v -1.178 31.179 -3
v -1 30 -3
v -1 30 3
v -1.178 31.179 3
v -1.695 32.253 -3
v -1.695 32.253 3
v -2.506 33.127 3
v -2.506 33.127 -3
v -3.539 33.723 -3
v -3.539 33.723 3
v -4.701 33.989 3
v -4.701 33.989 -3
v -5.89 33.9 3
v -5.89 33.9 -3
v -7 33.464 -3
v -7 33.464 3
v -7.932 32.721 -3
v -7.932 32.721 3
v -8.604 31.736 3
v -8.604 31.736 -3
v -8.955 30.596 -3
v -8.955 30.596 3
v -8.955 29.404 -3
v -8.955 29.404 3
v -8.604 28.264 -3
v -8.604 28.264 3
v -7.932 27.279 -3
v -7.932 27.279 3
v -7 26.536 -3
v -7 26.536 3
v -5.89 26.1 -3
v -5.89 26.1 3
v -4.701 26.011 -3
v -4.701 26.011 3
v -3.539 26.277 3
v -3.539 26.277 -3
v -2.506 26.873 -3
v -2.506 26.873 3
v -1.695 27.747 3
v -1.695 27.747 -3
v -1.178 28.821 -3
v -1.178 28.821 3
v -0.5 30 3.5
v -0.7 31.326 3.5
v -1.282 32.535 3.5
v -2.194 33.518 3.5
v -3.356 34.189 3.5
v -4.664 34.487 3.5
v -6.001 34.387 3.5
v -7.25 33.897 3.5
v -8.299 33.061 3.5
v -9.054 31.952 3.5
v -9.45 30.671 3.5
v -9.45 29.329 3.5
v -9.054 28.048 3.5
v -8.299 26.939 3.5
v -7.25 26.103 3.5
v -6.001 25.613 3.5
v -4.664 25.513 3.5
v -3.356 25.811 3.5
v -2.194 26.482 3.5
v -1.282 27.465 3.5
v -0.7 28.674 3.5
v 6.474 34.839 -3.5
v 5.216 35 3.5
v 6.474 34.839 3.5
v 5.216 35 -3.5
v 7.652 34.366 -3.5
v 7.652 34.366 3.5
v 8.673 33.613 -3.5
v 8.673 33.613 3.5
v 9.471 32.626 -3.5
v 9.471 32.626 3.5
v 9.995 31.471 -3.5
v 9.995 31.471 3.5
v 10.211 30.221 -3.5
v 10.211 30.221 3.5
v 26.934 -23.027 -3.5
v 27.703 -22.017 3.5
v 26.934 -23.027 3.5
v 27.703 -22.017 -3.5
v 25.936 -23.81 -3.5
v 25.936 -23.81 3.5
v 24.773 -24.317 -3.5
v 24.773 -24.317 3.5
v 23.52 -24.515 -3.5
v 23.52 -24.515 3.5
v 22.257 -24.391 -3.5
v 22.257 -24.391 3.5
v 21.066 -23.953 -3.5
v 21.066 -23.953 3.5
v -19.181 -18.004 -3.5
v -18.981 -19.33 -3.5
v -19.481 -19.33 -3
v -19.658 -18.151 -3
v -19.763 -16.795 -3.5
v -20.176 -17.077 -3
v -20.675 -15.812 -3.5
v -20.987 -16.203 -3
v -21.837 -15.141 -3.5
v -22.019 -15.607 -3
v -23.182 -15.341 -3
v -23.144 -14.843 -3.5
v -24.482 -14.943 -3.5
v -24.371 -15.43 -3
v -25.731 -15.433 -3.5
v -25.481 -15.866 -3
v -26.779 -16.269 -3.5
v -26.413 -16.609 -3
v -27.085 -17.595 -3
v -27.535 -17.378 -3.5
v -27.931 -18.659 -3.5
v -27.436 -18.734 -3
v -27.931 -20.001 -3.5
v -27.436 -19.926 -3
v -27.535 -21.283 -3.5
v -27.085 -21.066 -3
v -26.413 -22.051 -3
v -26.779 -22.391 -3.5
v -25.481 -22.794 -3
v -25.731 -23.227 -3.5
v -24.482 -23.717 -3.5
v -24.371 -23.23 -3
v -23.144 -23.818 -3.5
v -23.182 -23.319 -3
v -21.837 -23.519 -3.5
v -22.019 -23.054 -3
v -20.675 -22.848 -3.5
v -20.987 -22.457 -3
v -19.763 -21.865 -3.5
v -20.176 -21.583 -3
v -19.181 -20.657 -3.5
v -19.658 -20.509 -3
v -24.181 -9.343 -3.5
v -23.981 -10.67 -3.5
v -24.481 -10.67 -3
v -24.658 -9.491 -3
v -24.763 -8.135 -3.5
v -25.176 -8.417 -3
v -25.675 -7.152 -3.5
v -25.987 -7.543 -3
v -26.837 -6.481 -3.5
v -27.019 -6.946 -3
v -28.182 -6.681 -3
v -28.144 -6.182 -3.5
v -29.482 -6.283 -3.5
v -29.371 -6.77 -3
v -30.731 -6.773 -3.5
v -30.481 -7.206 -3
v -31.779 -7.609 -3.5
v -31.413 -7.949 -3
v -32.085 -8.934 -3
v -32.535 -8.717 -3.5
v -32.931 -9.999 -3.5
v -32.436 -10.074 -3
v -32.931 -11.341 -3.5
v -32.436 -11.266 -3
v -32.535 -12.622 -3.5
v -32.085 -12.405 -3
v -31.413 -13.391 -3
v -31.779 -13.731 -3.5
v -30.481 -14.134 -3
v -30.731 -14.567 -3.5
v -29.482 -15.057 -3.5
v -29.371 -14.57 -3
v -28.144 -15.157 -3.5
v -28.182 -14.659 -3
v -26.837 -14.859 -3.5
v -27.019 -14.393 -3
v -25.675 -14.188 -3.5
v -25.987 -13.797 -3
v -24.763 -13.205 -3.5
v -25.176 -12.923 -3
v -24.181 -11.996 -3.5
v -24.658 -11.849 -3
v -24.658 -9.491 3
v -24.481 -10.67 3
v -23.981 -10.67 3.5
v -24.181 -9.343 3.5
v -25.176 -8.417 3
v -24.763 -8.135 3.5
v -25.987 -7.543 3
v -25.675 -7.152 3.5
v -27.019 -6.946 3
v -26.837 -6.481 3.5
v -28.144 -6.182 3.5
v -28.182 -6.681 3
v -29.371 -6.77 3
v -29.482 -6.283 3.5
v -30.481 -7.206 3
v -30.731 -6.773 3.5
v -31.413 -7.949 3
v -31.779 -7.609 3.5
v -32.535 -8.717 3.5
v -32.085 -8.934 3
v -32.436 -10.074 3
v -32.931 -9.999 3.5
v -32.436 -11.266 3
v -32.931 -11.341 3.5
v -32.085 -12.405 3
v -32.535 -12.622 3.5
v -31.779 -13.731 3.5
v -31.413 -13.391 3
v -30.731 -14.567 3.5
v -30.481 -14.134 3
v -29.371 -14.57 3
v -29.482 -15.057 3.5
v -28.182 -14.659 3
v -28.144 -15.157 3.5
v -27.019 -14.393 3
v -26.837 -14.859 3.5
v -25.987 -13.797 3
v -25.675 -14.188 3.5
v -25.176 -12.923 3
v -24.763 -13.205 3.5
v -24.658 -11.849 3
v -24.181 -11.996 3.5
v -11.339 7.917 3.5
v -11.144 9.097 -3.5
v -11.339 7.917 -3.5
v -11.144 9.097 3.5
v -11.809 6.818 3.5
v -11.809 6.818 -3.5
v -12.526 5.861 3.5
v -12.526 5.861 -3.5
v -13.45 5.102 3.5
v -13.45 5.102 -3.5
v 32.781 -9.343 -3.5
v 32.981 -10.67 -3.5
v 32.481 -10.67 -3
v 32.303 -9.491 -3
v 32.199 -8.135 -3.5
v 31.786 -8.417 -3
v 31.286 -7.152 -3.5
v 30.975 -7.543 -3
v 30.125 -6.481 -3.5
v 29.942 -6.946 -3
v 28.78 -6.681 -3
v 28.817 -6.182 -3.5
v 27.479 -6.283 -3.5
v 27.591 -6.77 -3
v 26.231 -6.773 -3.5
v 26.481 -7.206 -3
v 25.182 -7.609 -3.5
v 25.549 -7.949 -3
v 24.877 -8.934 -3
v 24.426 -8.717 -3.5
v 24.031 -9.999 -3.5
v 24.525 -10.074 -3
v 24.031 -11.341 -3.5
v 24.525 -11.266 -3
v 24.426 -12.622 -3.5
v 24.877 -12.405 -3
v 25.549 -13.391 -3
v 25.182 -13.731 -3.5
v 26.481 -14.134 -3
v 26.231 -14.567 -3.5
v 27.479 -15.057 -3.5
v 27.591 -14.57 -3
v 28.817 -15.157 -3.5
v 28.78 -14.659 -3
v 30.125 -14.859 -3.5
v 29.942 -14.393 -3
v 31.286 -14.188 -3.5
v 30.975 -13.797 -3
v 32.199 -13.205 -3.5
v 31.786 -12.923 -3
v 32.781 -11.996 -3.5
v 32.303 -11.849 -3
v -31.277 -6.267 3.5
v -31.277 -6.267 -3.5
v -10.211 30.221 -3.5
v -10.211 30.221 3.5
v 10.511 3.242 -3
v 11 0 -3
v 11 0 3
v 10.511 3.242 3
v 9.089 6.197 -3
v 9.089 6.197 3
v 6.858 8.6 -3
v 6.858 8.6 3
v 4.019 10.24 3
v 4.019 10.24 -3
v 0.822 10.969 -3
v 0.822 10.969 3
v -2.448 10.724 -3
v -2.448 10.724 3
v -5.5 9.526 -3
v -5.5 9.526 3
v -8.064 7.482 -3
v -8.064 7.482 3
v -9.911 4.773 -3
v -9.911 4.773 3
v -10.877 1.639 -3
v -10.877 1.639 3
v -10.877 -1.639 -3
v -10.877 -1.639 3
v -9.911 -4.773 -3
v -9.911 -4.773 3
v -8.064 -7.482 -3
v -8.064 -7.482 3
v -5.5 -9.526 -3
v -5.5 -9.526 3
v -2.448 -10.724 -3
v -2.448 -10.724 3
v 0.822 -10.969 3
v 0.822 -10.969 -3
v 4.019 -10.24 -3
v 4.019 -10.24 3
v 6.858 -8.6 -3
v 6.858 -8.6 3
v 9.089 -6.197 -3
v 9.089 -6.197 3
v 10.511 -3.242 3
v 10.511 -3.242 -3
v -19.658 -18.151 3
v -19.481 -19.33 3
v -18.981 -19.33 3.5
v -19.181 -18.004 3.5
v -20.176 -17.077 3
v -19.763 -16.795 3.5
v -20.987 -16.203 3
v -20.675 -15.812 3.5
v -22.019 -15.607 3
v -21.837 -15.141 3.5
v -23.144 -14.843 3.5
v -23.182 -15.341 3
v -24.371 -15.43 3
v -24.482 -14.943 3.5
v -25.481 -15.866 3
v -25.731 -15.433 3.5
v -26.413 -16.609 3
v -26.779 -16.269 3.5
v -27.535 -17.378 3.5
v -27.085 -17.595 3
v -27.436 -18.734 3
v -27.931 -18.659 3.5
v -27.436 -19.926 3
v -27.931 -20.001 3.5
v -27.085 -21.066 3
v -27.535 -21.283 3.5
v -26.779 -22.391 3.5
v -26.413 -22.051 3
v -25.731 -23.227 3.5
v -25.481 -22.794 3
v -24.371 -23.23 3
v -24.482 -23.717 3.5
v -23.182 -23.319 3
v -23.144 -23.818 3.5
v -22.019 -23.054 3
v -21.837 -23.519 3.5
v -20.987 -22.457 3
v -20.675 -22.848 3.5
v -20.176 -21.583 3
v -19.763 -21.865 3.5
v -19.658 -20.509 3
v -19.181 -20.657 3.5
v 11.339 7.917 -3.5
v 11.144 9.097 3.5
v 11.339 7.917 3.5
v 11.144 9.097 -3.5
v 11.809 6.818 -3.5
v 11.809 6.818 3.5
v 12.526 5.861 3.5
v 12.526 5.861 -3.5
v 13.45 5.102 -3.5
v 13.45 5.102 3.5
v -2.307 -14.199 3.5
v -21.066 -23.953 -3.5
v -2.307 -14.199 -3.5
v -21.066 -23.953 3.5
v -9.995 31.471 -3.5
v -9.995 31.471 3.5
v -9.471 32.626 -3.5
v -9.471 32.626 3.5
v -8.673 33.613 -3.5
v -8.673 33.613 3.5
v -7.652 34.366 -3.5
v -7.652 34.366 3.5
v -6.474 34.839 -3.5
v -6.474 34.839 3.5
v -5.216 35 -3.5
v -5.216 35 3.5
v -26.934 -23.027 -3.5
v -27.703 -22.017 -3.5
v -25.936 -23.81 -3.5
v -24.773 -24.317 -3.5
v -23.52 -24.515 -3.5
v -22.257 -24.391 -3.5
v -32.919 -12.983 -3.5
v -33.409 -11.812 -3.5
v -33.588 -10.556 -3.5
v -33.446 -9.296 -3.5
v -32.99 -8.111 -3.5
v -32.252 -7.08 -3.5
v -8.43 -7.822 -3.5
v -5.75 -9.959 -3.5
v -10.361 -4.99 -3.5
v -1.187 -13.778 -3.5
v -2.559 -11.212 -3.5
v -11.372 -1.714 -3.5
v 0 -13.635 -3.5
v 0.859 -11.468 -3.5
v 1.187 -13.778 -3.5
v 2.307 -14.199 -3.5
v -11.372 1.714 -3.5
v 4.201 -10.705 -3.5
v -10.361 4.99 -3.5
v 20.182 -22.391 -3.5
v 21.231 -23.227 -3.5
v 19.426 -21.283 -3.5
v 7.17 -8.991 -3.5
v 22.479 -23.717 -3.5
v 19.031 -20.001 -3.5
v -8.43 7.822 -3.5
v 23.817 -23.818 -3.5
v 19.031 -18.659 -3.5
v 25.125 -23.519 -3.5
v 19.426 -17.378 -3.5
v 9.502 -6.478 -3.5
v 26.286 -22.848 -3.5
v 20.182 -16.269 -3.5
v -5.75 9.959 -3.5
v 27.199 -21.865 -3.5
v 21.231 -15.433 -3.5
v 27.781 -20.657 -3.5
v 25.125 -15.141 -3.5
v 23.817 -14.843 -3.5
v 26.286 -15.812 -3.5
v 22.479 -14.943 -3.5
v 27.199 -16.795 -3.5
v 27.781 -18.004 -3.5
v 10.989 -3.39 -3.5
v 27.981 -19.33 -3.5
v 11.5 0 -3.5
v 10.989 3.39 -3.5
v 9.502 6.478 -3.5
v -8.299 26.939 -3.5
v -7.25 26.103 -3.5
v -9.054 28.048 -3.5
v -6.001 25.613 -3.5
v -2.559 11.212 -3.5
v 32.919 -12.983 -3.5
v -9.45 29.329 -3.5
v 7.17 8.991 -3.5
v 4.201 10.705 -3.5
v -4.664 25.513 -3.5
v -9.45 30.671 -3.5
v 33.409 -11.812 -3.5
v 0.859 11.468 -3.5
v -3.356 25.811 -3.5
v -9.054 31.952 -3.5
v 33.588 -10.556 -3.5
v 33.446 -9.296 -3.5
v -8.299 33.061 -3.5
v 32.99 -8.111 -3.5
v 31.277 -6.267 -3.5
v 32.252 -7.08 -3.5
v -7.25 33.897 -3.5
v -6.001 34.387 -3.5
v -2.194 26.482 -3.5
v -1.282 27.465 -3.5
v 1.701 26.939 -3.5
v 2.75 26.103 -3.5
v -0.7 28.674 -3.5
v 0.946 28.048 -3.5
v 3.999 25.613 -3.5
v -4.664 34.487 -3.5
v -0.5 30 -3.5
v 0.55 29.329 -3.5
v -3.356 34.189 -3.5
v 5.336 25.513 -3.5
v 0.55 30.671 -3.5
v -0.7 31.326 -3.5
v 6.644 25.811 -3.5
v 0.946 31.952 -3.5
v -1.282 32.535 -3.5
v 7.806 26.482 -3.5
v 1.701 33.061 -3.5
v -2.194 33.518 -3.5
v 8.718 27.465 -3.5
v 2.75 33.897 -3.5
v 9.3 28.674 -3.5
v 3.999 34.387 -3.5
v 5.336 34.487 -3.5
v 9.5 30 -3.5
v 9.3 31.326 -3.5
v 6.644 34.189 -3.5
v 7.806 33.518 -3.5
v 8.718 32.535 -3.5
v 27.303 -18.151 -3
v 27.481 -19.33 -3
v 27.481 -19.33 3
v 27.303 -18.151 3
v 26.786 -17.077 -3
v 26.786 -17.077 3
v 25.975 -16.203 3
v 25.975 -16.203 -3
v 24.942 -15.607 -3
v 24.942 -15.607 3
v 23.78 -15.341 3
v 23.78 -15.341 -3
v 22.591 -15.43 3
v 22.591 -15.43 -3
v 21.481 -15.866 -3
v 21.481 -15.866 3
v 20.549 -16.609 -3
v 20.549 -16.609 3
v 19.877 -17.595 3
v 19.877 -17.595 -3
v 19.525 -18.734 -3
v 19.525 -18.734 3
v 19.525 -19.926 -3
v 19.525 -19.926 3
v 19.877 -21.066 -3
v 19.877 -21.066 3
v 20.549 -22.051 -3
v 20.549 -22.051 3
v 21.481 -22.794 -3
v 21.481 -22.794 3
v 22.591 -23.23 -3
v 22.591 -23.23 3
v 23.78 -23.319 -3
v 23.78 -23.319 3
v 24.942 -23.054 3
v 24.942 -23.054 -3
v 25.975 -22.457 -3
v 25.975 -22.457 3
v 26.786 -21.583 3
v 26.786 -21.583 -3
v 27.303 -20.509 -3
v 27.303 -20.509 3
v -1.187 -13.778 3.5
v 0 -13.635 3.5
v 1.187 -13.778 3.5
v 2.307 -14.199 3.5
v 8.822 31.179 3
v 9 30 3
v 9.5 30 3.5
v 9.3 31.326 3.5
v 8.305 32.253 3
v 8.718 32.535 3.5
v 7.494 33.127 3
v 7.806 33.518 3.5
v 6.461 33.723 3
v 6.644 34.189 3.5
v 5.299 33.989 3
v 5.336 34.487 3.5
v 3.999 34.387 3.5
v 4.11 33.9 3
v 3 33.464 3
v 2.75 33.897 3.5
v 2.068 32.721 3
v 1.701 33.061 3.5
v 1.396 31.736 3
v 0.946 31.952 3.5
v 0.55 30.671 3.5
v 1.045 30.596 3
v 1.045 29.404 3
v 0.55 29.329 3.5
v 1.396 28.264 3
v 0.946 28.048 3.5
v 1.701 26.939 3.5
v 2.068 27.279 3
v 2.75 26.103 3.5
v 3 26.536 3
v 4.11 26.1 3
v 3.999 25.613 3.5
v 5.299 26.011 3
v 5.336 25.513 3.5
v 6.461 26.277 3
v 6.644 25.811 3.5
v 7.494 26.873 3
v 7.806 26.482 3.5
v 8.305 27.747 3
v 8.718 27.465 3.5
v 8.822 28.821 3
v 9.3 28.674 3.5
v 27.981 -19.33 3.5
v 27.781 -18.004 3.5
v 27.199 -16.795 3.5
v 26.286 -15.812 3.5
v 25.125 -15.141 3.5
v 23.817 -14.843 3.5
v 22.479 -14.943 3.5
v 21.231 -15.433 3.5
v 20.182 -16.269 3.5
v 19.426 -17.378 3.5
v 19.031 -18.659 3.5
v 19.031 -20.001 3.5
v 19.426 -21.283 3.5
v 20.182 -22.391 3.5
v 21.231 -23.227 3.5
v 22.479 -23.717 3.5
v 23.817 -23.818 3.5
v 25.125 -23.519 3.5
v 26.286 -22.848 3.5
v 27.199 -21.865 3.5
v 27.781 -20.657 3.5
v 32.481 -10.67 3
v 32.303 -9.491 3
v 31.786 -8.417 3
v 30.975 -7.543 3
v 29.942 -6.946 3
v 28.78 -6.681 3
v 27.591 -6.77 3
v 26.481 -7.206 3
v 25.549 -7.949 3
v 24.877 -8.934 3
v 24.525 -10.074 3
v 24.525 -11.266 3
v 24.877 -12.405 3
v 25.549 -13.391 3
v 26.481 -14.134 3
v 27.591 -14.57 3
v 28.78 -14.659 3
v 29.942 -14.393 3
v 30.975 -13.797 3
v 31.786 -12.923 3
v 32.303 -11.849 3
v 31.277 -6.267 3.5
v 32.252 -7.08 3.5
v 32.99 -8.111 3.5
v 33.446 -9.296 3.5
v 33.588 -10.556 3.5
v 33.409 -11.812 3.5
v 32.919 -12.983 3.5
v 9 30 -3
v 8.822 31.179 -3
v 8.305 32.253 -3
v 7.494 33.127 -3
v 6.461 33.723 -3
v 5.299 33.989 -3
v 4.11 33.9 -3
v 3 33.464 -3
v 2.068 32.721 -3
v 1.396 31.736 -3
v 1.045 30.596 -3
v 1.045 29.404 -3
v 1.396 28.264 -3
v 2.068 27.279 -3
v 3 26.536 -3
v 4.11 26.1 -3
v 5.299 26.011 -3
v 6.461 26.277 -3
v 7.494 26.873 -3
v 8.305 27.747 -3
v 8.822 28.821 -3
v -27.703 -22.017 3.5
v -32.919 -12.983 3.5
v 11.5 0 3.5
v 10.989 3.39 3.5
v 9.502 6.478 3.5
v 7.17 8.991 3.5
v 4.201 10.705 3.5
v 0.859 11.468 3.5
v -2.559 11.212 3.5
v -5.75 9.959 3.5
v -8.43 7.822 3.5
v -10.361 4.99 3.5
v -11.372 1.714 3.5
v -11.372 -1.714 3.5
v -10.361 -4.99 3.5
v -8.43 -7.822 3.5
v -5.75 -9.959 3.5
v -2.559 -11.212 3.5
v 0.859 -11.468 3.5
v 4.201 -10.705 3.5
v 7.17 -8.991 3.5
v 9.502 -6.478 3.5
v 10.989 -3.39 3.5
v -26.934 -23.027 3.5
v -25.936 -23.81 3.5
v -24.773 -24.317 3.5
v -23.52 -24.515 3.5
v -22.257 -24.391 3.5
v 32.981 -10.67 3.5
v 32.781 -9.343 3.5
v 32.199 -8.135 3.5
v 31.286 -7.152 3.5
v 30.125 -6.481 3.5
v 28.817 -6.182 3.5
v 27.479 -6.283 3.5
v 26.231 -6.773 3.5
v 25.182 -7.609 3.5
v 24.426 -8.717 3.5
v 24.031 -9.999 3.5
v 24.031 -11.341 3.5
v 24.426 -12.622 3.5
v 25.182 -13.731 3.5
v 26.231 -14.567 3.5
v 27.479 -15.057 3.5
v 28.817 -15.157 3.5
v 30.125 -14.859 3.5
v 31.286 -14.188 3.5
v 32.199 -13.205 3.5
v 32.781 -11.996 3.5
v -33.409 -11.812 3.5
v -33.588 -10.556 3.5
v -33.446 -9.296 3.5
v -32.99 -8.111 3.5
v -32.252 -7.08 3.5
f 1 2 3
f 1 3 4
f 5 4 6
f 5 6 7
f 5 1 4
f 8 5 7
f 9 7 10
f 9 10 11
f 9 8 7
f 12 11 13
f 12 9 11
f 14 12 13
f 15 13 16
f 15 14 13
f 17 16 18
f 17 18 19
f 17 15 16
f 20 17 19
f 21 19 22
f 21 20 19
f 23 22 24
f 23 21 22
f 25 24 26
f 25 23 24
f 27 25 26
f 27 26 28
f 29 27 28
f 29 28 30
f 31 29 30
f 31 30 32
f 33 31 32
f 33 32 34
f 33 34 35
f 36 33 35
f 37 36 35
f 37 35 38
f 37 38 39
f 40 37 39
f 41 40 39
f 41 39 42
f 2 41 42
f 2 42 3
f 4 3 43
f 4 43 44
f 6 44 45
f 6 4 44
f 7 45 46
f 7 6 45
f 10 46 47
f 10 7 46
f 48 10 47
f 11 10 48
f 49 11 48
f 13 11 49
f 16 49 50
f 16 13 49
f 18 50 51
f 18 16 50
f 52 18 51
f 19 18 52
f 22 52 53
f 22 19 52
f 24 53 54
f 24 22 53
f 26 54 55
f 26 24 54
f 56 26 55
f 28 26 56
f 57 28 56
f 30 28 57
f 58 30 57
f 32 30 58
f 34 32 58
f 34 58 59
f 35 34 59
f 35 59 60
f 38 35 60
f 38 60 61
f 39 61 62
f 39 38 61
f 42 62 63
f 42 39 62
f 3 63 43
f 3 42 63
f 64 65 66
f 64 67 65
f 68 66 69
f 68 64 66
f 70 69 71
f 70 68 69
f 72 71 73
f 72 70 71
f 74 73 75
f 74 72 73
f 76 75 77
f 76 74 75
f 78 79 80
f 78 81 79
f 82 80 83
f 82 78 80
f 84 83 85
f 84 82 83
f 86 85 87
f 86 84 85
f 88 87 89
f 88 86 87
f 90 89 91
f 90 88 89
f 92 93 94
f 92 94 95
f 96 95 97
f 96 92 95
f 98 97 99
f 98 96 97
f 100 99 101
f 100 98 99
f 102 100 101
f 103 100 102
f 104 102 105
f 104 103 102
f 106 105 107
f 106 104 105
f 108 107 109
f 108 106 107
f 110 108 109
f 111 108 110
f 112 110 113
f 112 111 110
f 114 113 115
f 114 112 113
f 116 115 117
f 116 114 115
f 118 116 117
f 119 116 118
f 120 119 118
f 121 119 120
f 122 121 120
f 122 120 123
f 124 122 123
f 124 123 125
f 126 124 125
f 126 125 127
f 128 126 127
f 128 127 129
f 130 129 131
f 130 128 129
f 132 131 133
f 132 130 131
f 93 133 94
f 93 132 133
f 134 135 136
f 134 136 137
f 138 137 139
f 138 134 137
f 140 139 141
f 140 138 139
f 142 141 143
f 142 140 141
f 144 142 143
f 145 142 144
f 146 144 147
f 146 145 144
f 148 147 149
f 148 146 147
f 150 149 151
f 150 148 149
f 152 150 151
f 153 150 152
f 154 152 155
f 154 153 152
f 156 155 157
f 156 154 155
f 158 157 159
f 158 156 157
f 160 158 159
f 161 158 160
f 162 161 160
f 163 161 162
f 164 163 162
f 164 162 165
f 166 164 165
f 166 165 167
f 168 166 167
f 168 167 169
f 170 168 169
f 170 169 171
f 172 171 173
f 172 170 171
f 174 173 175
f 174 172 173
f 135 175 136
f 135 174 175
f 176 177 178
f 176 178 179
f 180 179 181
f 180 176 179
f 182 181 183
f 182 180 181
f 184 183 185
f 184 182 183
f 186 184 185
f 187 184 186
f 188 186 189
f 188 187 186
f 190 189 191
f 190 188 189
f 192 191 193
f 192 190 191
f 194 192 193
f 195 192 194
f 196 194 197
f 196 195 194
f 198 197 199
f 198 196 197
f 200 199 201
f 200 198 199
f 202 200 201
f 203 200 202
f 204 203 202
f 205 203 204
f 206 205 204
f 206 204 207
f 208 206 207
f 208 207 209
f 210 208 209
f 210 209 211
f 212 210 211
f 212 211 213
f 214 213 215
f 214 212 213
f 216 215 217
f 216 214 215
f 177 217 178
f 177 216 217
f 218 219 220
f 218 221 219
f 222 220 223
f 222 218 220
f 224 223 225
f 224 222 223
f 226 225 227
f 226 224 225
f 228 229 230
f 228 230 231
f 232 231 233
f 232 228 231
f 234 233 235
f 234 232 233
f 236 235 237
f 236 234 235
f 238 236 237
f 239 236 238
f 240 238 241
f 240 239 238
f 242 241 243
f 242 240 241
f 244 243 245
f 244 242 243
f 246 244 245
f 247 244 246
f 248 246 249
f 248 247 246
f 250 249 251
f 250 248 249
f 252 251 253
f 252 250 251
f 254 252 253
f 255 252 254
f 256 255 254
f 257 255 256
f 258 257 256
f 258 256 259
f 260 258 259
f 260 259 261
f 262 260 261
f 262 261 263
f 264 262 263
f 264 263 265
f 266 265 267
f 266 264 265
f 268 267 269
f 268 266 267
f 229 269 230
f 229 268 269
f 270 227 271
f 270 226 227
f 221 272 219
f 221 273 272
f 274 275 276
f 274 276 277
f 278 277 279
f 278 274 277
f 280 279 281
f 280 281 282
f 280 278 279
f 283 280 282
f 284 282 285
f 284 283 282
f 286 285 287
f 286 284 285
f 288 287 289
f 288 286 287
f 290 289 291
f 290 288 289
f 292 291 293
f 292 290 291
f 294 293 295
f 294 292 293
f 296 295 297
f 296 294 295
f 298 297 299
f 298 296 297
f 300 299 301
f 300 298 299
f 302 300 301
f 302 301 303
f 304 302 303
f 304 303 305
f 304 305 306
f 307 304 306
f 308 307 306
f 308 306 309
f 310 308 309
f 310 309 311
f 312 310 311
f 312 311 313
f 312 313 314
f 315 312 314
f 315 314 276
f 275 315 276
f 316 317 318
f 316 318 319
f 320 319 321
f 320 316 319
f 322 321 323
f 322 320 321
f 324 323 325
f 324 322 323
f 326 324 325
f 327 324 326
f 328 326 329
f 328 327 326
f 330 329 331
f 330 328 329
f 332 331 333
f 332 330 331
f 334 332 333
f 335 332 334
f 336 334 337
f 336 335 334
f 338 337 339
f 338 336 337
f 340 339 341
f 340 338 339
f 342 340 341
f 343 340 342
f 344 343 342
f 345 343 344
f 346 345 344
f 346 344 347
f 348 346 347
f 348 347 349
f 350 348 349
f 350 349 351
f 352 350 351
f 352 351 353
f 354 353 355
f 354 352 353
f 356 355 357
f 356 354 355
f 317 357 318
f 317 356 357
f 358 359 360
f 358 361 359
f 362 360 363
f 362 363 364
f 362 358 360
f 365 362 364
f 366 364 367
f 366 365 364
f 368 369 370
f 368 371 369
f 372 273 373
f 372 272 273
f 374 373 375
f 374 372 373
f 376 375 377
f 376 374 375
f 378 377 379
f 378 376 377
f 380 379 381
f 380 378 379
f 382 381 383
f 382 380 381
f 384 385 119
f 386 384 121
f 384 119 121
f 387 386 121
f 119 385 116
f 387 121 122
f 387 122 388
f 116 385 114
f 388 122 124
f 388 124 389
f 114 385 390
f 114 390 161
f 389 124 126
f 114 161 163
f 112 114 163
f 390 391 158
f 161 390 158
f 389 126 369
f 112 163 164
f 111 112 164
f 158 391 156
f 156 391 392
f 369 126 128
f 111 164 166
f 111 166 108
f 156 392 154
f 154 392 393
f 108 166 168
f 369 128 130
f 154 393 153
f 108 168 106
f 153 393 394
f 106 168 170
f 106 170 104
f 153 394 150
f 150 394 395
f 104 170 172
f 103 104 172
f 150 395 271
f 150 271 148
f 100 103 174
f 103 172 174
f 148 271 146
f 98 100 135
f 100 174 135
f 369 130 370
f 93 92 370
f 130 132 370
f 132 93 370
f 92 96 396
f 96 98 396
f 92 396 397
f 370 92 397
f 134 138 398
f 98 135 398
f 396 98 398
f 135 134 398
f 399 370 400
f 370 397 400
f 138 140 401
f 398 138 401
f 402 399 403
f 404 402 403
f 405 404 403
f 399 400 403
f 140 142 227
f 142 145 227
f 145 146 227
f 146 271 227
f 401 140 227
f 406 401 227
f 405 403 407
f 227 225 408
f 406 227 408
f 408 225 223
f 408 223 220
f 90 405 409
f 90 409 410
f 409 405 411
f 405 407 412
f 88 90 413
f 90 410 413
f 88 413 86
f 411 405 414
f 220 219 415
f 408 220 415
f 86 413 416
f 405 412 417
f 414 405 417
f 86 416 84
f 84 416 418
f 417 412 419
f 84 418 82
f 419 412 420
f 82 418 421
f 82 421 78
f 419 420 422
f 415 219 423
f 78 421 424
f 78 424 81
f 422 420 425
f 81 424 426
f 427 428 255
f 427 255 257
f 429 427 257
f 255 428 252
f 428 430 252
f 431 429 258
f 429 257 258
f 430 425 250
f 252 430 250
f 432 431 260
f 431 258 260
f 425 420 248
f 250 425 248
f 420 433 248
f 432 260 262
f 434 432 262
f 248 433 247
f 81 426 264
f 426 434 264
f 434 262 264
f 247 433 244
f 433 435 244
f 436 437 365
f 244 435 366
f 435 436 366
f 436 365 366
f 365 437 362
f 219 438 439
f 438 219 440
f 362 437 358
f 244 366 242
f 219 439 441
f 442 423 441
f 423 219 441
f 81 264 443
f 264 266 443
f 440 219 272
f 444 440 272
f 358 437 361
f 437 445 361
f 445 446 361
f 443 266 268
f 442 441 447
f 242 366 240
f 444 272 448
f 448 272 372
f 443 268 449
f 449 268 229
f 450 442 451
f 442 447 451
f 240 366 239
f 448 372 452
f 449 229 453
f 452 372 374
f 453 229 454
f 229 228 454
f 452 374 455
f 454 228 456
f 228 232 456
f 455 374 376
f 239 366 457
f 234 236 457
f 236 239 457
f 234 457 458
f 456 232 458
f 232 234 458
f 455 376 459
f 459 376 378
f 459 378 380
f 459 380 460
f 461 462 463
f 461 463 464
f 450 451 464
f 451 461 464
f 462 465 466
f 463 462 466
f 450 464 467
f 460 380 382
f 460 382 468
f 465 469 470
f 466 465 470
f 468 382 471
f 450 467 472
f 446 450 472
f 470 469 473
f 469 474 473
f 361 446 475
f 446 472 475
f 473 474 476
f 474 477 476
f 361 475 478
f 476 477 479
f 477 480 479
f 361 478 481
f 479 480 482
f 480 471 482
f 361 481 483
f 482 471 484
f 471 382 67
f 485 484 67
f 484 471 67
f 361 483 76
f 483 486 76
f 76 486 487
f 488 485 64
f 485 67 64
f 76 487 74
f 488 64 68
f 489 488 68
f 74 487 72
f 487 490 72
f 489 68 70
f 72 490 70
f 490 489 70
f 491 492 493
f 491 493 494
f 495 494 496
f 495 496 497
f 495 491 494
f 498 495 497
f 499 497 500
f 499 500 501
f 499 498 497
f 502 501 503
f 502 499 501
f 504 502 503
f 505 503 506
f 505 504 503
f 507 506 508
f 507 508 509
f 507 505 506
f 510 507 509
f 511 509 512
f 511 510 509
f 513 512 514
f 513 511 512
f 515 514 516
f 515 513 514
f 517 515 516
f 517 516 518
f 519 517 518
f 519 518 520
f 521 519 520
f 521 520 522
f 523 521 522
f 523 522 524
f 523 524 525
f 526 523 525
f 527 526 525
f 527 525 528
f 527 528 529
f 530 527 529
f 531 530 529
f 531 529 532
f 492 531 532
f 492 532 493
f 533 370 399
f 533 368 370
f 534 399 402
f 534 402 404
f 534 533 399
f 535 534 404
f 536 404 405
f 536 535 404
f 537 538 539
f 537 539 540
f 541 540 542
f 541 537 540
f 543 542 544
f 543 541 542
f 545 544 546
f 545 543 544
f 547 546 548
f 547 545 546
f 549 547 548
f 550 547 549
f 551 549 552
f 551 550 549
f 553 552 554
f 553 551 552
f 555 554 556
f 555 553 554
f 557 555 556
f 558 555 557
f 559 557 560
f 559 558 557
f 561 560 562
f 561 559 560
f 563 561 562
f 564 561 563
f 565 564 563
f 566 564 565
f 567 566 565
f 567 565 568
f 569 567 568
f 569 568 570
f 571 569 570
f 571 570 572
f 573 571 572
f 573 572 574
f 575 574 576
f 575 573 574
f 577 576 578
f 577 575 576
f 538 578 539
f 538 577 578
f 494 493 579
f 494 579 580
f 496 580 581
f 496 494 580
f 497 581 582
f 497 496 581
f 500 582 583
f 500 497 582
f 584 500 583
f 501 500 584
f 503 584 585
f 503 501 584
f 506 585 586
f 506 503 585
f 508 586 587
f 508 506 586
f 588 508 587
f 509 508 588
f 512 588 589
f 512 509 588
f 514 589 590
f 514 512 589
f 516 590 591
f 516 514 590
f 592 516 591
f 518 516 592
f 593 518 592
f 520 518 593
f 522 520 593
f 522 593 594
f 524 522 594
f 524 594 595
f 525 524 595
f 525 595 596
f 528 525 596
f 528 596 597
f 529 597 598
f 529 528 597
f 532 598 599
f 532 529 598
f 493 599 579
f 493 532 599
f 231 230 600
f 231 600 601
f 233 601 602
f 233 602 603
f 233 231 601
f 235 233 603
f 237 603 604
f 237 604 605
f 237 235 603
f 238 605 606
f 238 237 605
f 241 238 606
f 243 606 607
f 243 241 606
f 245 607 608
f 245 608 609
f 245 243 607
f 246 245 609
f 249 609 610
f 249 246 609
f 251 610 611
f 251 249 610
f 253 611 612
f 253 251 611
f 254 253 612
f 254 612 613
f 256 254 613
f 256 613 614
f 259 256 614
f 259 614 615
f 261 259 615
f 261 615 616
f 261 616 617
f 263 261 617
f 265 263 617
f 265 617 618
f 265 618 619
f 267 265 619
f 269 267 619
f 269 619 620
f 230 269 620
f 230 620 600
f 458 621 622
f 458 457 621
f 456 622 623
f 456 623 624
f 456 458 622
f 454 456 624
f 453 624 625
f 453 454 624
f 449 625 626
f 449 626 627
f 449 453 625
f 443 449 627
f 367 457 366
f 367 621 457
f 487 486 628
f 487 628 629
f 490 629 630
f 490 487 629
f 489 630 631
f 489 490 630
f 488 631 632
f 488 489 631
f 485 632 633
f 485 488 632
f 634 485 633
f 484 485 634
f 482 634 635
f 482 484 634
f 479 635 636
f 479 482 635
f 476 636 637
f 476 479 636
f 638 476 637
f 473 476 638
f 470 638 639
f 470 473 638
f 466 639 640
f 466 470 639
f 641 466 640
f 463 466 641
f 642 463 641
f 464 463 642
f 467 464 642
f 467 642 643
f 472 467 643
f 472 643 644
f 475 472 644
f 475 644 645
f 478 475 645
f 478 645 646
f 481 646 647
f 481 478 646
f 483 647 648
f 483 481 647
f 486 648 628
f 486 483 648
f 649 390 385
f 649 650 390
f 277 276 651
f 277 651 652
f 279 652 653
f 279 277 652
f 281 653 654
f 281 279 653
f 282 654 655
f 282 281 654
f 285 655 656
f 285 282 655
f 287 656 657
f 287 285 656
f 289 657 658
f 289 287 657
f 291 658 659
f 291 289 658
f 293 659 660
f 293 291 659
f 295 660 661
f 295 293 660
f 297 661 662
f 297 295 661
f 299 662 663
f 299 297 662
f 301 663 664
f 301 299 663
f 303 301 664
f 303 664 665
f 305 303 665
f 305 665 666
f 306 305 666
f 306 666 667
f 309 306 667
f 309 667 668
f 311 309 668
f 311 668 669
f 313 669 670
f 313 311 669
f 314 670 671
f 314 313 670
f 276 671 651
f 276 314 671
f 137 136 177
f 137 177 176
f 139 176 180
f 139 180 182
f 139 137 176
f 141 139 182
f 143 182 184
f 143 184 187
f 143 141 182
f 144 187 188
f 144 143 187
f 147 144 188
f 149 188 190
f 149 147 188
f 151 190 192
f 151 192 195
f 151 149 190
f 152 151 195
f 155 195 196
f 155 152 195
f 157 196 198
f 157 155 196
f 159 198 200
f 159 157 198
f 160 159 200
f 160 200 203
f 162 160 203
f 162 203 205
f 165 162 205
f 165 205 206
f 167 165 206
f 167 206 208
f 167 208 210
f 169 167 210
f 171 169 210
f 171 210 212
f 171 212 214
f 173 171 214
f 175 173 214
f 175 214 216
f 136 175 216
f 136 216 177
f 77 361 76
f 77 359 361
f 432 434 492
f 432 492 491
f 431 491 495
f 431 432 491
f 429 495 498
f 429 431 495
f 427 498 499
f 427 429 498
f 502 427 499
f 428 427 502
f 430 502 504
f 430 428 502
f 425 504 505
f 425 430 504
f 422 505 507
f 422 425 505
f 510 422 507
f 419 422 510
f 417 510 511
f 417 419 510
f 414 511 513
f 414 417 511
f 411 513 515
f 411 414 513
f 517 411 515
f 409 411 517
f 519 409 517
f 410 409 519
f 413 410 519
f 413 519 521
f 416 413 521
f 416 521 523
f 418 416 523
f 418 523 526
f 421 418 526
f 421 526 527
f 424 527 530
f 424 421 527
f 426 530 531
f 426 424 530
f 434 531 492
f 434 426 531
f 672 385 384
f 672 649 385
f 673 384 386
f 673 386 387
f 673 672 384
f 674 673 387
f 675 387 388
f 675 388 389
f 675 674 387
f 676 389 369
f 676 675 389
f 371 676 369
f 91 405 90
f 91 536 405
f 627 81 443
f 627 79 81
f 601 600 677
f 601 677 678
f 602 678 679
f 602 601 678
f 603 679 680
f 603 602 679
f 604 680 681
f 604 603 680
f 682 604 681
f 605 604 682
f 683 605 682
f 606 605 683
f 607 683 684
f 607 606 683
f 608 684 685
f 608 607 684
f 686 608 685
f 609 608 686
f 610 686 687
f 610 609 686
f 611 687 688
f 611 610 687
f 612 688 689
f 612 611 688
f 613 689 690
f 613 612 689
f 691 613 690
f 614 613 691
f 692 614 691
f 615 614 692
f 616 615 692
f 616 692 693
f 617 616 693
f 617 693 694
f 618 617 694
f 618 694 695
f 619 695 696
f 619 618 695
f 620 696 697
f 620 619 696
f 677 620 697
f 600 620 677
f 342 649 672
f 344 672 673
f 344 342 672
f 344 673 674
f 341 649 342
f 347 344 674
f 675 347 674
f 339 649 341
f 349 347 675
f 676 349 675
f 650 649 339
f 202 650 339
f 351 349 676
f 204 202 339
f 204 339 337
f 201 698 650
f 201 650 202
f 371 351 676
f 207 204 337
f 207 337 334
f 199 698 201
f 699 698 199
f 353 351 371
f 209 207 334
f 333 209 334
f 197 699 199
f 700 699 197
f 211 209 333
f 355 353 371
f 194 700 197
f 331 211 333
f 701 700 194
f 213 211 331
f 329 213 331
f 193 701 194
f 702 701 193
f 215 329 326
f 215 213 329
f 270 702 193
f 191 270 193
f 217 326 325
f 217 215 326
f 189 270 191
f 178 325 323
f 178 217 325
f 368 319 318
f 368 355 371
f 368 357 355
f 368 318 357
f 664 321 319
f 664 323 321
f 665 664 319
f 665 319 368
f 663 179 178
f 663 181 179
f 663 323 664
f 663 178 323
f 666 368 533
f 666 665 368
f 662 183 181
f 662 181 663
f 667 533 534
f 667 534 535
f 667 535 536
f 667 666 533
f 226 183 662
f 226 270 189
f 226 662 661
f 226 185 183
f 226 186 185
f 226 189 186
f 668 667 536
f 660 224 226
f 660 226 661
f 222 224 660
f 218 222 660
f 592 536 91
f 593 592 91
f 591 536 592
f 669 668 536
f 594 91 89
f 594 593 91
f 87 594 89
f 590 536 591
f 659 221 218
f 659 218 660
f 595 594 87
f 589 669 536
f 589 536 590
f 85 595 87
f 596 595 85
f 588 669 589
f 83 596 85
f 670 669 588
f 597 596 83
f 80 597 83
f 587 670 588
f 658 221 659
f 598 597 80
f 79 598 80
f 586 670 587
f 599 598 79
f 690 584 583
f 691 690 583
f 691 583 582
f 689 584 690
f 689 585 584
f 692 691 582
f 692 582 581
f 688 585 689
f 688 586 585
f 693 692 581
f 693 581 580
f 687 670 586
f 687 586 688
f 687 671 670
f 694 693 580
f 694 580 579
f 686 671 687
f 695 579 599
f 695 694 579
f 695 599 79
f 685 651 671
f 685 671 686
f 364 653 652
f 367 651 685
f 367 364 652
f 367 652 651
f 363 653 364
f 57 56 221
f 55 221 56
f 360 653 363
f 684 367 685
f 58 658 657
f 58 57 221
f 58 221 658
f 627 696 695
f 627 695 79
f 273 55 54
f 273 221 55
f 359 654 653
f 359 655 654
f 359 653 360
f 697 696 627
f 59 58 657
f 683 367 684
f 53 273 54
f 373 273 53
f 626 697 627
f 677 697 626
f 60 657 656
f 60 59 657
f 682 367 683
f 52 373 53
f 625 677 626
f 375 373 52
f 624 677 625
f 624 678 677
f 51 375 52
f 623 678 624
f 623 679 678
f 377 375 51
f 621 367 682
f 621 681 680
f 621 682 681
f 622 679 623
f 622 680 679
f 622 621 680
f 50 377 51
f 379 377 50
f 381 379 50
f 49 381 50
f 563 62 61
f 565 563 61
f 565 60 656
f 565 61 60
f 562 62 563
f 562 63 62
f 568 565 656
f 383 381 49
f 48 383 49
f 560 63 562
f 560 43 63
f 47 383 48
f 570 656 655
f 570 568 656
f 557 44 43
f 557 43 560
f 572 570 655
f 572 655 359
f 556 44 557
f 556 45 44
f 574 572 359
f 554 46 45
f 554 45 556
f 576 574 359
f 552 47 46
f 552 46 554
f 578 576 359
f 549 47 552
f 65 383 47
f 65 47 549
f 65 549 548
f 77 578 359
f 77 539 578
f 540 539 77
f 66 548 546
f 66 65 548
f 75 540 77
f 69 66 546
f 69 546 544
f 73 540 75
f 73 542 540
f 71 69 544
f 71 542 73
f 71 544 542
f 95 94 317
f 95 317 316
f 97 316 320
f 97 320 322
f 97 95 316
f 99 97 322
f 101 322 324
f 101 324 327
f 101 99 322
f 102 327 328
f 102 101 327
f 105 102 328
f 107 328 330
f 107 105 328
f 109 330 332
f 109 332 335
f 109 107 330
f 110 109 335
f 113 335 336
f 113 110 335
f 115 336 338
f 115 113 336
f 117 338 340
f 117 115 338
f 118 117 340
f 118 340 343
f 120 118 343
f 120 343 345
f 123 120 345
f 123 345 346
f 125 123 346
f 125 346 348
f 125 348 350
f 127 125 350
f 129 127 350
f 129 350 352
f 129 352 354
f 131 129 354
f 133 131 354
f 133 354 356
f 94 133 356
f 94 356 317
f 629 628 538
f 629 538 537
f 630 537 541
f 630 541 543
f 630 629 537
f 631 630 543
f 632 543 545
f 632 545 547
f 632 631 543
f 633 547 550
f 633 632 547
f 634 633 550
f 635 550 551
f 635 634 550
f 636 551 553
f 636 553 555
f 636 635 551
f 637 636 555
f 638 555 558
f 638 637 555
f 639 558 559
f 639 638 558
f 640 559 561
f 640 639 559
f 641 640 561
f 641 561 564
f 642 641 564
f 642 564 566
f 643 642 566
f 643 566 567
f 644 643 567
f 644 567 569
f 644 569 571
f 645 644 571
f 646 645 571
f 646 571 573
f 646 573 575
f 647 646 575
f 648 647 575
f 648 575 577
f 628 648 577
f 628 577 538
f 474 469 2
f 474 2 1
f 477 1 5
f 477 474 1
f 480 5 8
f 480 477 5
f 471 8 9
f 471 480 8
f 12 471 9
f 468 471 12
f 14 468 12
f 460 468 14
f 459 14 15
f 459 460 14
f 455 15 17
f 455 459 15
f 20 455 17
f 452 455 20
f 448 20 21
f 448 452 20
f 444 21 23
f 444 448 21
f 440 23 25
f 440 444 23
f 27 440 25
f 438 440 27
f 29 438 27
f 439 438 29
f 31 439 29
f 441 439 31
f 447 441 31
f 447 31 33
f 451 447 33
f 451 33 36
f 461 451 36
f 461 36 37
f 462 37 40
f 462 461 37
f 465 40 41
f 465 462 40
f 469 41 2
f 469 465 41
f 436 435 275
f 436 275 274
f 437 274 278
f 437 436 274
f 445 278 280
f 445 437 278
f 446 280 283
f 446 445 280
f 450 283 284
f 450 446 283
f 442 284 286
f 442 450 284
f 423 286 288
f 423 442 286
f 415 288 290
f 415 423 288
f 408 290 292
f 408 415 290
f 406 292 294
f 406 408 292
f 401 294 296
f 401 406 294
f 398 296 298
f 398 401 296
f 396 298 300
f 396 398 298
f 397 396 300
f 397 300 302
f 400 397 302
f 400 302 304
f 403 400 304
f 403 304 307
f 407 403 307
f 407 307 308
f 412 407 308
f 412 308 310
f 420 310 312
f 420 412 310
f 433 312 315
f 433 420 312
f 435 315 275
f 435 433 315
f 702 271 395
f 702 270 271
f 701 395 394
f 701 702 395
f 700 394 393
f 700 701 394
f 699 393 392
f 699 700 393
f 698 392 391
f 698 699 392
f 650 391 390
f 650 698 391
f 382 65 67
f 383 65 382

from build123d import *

# Parameters (mm, degrees)
F0_R     = 4
F0_R_2   = 11
F1_DEPTH = 3.5
F2_SIZE  = 0.5
F3_R     = 5


with BuildPart() as f1:
    # F0 (on Top) → F1 (new body, symmetric)
    with BuildSketch(Plane.XY):
        with BuildLine():
            ThreePointArc((-11.25833, 6.5), (0, 13), (11.25833, 6.5))
            Line((11.25833, 6.5), (10, 35))
            Line((10, 35), (-10, 35))
            Line((-10, 35), (-11.25833, 6.5))
        make_face()
        with Locations((-5, 30)):
            Circle(F0_R, mode=Mode.SUBTRACT)
        with Locations((5, 30)):
            Circle(F0_R, mode=Mode.SUBTRACT)
        with BuildLine():
            ThreePointArc((0, -13), (9.192388, -9.192388), (13, 0))
            ThreePointArc((13, 0), (12.557036, 3.364648), (11.25833, 6.5))
            ThreePointArc((11.25833, 6.5), (0, 13), (-11.25833, 6.5))
            ThreePointArc((-11.25833, 6.5), (-11.25833, -6.5), (0, -13))
        make_face()
        Circle(F0_R_2, mode=Mode.SUBTRACT)
        with BuildLine():
            Line((-25.310889, -26.160254), (0, -13))
            ThreePointArc((0, -13), (-11.25833, -6.5), (-11.25833, 6.5))
            Line((-11.25833, 6.5), (-35.310889, -8.839746))
            Line((-35.310889, -8.839746), (-25.310889, -26.160254))
        make_face()
        with Locations((-23.480762, -19.330127)):
            Circle(F0_R, mode=Mode.SUBTRACT)
        with Locations((-28.480762, -10.669873)):
            Circle(F0_R, mode=Mode.SUBTRACT)
        with BuildLine():
            ThreePointArc((11.25833, 6.5), (12.557036, 3.364648), (13, 0))
            ThreePointArc((13, 0), (9.192388, -9.192388), (0, -13))
            Line((0, -13), (25.310889, -26.160254))
            Line((25.310889, -26.160254), (35.310889, -8.839746))
            Line((35.310889, -8.839746), (11.25833, 6.5))
        make_face()
        with Locations((23.480762, -19.330127)):
            Circle(F0_R, mode=Mode.SUBTRACT)
        with Locations((28.480762, -10.669873)):
            Circle(F0_R, mode=Mode.SUBTRACT)
    extrude(amount=F1_DEPTH, both=True)

    # F2
    f2_edges = [f1.edges().sort_by_distance(p)[0] for p in [
        (-9, 30, 3.5),
        (1, 30, 3.5),
        (-11, 0, 3.5),
        (-32.480762, -10.669873, 3.5),
        (-27.480762, -19.330127, 3.5),
        (24.480762, -10.669873, 3.5),
        (19.480762, -19.330127, 3.5),
        (-11, 0, -3.5),
        (-27.480762, -19.330127, -3.5),
        (-32.480762, -10.669873, -3.5),
        (19.480762, -19.330127, -3.5),
        (24.480762, -10.669873, -3.5),
        (1, 30, -3.5),
        (-9, 30, -3.5),
    ]]
    chamfer(f2_edges, length=F2_SIZE)

    # F3
    f3_edges = [f1.edges().sort_by_distance(p)[0] for p in [
        (-25.310889, -26.160254, 0),
        (-35.310889, -8.839746, 0),
        (25.310889, -26.160254, 0),
        (35.310889, -8.839746, 0),
        (10, 35, 0),
        (-10, 35, 0),
        (-11.25833, 6.5, 0),
        (11.25833, 6.5, 0),
        (0, -13, 0),
    ]]
    fillet(f3_edges, radius=F3_R)


solid = f1.part
